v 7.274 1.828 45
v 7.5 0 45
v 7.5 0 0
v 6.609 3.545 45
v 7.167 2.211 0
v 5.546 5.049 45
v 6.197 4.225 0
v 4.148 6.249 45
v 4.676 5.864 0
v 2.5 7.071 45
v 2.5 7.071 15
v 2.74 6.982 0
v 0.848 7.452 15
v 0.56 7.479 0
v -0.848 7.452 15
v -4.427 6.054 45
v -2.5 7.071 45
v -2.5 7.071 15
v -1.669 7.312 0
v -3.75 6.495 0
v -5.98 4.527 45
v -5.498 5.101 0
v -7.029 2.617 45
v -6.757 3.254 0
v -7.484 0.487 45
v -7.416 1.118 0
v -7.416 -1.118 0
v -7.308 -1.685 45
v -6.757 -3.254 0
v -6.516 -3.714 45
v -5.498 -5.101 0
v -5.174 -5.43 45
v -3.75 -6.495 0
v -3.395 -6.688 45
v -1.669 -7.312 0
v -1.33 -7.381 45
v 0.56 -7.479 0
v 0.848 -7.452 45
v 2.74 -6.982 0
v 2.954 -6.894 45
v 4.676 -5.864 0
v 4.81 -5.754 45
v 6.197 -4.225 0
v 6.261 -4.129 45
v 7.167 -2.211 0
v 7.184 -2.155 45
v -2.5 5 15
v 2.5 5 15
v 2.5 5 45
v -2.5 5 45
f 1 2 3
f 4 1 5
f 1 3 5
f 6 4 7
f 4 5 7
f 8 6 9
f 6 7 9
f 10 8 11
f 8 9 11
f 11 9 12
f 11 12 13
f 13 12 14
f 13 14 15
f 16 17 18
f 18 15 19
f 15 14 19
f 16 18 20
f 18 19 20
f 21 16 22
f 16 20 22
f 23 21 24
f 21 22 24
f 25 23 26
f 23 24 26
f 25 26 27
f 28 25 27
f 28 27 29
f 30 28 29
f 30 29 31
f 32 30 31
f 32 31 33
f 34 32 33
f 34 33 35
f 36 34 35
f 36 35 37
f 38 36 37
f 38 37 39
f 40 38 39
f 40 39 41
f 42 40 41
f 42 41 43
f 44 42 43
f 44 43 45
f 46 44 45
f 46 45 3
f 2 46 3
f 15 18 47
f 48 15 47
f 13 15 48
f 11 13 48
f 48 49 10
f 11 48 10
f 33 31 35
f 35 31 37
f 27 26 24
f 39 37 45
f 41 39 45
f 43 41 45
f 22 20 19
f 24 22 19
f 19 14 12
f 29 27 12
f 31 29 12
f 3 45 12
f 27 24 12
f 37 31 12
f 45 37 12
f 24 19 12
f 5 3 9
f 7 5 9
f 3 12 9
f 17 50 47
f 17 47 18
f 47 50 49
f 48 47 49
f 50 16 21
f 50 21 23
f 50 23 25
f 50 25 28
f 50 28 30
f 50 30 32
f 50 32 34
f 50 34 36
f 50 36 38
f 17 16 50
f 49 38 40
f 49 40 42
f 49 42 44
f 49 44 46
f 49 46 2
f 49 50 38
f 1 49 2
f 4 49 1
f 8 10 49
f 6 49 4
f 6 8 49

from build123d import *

# Parameters (mm, degrees)
SKETCH1_R           = 7.5
BOSS_EXTRUDE1_DEPTH = 45
SKETCH2_W           = 5
SKETCH2_H           = 4.459975541
CUT_EXTRUDE1_DEPTH  = 30


with BuildPart() as part:
    # Sketch1 → Boss-Extrude1 (new body)
    with BuildSketch(Plane.XY):
        Circle(SKETCH1_R)
    extrude(amount=BOSS_EXTRUDE1_DEPTH)

    # Sketch2 → Cut-Extrude1 (cut)
    with BuildSketch(Plane.XY.offset(45)):
        with Locations((0, 7.229987771)):
            Rectangle(SKETCH2_W, SKETCH2_H)
    extrude(amount=-CUT_EXTRUDE1_DEPTH, mode=Mode.SUBTRACT)


solid = part.part
